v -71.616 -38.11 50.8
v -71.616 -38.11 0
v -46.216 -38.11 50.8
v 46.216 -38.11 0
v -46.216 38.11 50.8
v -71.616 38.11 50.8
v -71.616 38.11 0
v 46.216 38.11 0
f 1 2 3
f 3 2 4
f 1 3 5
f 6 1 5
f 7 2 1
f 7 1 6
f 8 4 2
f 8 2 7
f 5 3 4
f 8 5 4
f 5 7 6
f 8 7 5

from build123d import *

# Parameters (mm, degrees)
F0_W     = 92.4328938127
F0_H     = 76.2194246054
F1_DEPTH = 50.8
F3_DEPTH = 127
F4_DEPTH = 25.4


with BuildPart() as f1:
    # F0 (on Top) → F1 (new body)
    with BuildSketch(Plane.XY):
        Rectangle(F0_W, F0_H)
    extrude(amount=F1_DEPTH)

    # F2 (on face) → F3 (cut)
    with BuildSketch(Plane.XZ.offset(38.1097123027)):
        Polygon((46.2164469063, 50.8), (-46.2164469063, 50.8), (46.2164469063, 0), align=None)
    extrude(amount=-F3_DEPTH, mode=Mode.SUBTRACT)

    # F4 (add): a face of the model
    f4_faces = [f1.faces().sort_by_distance(p)[0] for p in [
        (-46.2164469063, 0, 25.4),
    ]]
    extrude(f4_faces, amount=F4_DEPTH)


solid = f1.part
